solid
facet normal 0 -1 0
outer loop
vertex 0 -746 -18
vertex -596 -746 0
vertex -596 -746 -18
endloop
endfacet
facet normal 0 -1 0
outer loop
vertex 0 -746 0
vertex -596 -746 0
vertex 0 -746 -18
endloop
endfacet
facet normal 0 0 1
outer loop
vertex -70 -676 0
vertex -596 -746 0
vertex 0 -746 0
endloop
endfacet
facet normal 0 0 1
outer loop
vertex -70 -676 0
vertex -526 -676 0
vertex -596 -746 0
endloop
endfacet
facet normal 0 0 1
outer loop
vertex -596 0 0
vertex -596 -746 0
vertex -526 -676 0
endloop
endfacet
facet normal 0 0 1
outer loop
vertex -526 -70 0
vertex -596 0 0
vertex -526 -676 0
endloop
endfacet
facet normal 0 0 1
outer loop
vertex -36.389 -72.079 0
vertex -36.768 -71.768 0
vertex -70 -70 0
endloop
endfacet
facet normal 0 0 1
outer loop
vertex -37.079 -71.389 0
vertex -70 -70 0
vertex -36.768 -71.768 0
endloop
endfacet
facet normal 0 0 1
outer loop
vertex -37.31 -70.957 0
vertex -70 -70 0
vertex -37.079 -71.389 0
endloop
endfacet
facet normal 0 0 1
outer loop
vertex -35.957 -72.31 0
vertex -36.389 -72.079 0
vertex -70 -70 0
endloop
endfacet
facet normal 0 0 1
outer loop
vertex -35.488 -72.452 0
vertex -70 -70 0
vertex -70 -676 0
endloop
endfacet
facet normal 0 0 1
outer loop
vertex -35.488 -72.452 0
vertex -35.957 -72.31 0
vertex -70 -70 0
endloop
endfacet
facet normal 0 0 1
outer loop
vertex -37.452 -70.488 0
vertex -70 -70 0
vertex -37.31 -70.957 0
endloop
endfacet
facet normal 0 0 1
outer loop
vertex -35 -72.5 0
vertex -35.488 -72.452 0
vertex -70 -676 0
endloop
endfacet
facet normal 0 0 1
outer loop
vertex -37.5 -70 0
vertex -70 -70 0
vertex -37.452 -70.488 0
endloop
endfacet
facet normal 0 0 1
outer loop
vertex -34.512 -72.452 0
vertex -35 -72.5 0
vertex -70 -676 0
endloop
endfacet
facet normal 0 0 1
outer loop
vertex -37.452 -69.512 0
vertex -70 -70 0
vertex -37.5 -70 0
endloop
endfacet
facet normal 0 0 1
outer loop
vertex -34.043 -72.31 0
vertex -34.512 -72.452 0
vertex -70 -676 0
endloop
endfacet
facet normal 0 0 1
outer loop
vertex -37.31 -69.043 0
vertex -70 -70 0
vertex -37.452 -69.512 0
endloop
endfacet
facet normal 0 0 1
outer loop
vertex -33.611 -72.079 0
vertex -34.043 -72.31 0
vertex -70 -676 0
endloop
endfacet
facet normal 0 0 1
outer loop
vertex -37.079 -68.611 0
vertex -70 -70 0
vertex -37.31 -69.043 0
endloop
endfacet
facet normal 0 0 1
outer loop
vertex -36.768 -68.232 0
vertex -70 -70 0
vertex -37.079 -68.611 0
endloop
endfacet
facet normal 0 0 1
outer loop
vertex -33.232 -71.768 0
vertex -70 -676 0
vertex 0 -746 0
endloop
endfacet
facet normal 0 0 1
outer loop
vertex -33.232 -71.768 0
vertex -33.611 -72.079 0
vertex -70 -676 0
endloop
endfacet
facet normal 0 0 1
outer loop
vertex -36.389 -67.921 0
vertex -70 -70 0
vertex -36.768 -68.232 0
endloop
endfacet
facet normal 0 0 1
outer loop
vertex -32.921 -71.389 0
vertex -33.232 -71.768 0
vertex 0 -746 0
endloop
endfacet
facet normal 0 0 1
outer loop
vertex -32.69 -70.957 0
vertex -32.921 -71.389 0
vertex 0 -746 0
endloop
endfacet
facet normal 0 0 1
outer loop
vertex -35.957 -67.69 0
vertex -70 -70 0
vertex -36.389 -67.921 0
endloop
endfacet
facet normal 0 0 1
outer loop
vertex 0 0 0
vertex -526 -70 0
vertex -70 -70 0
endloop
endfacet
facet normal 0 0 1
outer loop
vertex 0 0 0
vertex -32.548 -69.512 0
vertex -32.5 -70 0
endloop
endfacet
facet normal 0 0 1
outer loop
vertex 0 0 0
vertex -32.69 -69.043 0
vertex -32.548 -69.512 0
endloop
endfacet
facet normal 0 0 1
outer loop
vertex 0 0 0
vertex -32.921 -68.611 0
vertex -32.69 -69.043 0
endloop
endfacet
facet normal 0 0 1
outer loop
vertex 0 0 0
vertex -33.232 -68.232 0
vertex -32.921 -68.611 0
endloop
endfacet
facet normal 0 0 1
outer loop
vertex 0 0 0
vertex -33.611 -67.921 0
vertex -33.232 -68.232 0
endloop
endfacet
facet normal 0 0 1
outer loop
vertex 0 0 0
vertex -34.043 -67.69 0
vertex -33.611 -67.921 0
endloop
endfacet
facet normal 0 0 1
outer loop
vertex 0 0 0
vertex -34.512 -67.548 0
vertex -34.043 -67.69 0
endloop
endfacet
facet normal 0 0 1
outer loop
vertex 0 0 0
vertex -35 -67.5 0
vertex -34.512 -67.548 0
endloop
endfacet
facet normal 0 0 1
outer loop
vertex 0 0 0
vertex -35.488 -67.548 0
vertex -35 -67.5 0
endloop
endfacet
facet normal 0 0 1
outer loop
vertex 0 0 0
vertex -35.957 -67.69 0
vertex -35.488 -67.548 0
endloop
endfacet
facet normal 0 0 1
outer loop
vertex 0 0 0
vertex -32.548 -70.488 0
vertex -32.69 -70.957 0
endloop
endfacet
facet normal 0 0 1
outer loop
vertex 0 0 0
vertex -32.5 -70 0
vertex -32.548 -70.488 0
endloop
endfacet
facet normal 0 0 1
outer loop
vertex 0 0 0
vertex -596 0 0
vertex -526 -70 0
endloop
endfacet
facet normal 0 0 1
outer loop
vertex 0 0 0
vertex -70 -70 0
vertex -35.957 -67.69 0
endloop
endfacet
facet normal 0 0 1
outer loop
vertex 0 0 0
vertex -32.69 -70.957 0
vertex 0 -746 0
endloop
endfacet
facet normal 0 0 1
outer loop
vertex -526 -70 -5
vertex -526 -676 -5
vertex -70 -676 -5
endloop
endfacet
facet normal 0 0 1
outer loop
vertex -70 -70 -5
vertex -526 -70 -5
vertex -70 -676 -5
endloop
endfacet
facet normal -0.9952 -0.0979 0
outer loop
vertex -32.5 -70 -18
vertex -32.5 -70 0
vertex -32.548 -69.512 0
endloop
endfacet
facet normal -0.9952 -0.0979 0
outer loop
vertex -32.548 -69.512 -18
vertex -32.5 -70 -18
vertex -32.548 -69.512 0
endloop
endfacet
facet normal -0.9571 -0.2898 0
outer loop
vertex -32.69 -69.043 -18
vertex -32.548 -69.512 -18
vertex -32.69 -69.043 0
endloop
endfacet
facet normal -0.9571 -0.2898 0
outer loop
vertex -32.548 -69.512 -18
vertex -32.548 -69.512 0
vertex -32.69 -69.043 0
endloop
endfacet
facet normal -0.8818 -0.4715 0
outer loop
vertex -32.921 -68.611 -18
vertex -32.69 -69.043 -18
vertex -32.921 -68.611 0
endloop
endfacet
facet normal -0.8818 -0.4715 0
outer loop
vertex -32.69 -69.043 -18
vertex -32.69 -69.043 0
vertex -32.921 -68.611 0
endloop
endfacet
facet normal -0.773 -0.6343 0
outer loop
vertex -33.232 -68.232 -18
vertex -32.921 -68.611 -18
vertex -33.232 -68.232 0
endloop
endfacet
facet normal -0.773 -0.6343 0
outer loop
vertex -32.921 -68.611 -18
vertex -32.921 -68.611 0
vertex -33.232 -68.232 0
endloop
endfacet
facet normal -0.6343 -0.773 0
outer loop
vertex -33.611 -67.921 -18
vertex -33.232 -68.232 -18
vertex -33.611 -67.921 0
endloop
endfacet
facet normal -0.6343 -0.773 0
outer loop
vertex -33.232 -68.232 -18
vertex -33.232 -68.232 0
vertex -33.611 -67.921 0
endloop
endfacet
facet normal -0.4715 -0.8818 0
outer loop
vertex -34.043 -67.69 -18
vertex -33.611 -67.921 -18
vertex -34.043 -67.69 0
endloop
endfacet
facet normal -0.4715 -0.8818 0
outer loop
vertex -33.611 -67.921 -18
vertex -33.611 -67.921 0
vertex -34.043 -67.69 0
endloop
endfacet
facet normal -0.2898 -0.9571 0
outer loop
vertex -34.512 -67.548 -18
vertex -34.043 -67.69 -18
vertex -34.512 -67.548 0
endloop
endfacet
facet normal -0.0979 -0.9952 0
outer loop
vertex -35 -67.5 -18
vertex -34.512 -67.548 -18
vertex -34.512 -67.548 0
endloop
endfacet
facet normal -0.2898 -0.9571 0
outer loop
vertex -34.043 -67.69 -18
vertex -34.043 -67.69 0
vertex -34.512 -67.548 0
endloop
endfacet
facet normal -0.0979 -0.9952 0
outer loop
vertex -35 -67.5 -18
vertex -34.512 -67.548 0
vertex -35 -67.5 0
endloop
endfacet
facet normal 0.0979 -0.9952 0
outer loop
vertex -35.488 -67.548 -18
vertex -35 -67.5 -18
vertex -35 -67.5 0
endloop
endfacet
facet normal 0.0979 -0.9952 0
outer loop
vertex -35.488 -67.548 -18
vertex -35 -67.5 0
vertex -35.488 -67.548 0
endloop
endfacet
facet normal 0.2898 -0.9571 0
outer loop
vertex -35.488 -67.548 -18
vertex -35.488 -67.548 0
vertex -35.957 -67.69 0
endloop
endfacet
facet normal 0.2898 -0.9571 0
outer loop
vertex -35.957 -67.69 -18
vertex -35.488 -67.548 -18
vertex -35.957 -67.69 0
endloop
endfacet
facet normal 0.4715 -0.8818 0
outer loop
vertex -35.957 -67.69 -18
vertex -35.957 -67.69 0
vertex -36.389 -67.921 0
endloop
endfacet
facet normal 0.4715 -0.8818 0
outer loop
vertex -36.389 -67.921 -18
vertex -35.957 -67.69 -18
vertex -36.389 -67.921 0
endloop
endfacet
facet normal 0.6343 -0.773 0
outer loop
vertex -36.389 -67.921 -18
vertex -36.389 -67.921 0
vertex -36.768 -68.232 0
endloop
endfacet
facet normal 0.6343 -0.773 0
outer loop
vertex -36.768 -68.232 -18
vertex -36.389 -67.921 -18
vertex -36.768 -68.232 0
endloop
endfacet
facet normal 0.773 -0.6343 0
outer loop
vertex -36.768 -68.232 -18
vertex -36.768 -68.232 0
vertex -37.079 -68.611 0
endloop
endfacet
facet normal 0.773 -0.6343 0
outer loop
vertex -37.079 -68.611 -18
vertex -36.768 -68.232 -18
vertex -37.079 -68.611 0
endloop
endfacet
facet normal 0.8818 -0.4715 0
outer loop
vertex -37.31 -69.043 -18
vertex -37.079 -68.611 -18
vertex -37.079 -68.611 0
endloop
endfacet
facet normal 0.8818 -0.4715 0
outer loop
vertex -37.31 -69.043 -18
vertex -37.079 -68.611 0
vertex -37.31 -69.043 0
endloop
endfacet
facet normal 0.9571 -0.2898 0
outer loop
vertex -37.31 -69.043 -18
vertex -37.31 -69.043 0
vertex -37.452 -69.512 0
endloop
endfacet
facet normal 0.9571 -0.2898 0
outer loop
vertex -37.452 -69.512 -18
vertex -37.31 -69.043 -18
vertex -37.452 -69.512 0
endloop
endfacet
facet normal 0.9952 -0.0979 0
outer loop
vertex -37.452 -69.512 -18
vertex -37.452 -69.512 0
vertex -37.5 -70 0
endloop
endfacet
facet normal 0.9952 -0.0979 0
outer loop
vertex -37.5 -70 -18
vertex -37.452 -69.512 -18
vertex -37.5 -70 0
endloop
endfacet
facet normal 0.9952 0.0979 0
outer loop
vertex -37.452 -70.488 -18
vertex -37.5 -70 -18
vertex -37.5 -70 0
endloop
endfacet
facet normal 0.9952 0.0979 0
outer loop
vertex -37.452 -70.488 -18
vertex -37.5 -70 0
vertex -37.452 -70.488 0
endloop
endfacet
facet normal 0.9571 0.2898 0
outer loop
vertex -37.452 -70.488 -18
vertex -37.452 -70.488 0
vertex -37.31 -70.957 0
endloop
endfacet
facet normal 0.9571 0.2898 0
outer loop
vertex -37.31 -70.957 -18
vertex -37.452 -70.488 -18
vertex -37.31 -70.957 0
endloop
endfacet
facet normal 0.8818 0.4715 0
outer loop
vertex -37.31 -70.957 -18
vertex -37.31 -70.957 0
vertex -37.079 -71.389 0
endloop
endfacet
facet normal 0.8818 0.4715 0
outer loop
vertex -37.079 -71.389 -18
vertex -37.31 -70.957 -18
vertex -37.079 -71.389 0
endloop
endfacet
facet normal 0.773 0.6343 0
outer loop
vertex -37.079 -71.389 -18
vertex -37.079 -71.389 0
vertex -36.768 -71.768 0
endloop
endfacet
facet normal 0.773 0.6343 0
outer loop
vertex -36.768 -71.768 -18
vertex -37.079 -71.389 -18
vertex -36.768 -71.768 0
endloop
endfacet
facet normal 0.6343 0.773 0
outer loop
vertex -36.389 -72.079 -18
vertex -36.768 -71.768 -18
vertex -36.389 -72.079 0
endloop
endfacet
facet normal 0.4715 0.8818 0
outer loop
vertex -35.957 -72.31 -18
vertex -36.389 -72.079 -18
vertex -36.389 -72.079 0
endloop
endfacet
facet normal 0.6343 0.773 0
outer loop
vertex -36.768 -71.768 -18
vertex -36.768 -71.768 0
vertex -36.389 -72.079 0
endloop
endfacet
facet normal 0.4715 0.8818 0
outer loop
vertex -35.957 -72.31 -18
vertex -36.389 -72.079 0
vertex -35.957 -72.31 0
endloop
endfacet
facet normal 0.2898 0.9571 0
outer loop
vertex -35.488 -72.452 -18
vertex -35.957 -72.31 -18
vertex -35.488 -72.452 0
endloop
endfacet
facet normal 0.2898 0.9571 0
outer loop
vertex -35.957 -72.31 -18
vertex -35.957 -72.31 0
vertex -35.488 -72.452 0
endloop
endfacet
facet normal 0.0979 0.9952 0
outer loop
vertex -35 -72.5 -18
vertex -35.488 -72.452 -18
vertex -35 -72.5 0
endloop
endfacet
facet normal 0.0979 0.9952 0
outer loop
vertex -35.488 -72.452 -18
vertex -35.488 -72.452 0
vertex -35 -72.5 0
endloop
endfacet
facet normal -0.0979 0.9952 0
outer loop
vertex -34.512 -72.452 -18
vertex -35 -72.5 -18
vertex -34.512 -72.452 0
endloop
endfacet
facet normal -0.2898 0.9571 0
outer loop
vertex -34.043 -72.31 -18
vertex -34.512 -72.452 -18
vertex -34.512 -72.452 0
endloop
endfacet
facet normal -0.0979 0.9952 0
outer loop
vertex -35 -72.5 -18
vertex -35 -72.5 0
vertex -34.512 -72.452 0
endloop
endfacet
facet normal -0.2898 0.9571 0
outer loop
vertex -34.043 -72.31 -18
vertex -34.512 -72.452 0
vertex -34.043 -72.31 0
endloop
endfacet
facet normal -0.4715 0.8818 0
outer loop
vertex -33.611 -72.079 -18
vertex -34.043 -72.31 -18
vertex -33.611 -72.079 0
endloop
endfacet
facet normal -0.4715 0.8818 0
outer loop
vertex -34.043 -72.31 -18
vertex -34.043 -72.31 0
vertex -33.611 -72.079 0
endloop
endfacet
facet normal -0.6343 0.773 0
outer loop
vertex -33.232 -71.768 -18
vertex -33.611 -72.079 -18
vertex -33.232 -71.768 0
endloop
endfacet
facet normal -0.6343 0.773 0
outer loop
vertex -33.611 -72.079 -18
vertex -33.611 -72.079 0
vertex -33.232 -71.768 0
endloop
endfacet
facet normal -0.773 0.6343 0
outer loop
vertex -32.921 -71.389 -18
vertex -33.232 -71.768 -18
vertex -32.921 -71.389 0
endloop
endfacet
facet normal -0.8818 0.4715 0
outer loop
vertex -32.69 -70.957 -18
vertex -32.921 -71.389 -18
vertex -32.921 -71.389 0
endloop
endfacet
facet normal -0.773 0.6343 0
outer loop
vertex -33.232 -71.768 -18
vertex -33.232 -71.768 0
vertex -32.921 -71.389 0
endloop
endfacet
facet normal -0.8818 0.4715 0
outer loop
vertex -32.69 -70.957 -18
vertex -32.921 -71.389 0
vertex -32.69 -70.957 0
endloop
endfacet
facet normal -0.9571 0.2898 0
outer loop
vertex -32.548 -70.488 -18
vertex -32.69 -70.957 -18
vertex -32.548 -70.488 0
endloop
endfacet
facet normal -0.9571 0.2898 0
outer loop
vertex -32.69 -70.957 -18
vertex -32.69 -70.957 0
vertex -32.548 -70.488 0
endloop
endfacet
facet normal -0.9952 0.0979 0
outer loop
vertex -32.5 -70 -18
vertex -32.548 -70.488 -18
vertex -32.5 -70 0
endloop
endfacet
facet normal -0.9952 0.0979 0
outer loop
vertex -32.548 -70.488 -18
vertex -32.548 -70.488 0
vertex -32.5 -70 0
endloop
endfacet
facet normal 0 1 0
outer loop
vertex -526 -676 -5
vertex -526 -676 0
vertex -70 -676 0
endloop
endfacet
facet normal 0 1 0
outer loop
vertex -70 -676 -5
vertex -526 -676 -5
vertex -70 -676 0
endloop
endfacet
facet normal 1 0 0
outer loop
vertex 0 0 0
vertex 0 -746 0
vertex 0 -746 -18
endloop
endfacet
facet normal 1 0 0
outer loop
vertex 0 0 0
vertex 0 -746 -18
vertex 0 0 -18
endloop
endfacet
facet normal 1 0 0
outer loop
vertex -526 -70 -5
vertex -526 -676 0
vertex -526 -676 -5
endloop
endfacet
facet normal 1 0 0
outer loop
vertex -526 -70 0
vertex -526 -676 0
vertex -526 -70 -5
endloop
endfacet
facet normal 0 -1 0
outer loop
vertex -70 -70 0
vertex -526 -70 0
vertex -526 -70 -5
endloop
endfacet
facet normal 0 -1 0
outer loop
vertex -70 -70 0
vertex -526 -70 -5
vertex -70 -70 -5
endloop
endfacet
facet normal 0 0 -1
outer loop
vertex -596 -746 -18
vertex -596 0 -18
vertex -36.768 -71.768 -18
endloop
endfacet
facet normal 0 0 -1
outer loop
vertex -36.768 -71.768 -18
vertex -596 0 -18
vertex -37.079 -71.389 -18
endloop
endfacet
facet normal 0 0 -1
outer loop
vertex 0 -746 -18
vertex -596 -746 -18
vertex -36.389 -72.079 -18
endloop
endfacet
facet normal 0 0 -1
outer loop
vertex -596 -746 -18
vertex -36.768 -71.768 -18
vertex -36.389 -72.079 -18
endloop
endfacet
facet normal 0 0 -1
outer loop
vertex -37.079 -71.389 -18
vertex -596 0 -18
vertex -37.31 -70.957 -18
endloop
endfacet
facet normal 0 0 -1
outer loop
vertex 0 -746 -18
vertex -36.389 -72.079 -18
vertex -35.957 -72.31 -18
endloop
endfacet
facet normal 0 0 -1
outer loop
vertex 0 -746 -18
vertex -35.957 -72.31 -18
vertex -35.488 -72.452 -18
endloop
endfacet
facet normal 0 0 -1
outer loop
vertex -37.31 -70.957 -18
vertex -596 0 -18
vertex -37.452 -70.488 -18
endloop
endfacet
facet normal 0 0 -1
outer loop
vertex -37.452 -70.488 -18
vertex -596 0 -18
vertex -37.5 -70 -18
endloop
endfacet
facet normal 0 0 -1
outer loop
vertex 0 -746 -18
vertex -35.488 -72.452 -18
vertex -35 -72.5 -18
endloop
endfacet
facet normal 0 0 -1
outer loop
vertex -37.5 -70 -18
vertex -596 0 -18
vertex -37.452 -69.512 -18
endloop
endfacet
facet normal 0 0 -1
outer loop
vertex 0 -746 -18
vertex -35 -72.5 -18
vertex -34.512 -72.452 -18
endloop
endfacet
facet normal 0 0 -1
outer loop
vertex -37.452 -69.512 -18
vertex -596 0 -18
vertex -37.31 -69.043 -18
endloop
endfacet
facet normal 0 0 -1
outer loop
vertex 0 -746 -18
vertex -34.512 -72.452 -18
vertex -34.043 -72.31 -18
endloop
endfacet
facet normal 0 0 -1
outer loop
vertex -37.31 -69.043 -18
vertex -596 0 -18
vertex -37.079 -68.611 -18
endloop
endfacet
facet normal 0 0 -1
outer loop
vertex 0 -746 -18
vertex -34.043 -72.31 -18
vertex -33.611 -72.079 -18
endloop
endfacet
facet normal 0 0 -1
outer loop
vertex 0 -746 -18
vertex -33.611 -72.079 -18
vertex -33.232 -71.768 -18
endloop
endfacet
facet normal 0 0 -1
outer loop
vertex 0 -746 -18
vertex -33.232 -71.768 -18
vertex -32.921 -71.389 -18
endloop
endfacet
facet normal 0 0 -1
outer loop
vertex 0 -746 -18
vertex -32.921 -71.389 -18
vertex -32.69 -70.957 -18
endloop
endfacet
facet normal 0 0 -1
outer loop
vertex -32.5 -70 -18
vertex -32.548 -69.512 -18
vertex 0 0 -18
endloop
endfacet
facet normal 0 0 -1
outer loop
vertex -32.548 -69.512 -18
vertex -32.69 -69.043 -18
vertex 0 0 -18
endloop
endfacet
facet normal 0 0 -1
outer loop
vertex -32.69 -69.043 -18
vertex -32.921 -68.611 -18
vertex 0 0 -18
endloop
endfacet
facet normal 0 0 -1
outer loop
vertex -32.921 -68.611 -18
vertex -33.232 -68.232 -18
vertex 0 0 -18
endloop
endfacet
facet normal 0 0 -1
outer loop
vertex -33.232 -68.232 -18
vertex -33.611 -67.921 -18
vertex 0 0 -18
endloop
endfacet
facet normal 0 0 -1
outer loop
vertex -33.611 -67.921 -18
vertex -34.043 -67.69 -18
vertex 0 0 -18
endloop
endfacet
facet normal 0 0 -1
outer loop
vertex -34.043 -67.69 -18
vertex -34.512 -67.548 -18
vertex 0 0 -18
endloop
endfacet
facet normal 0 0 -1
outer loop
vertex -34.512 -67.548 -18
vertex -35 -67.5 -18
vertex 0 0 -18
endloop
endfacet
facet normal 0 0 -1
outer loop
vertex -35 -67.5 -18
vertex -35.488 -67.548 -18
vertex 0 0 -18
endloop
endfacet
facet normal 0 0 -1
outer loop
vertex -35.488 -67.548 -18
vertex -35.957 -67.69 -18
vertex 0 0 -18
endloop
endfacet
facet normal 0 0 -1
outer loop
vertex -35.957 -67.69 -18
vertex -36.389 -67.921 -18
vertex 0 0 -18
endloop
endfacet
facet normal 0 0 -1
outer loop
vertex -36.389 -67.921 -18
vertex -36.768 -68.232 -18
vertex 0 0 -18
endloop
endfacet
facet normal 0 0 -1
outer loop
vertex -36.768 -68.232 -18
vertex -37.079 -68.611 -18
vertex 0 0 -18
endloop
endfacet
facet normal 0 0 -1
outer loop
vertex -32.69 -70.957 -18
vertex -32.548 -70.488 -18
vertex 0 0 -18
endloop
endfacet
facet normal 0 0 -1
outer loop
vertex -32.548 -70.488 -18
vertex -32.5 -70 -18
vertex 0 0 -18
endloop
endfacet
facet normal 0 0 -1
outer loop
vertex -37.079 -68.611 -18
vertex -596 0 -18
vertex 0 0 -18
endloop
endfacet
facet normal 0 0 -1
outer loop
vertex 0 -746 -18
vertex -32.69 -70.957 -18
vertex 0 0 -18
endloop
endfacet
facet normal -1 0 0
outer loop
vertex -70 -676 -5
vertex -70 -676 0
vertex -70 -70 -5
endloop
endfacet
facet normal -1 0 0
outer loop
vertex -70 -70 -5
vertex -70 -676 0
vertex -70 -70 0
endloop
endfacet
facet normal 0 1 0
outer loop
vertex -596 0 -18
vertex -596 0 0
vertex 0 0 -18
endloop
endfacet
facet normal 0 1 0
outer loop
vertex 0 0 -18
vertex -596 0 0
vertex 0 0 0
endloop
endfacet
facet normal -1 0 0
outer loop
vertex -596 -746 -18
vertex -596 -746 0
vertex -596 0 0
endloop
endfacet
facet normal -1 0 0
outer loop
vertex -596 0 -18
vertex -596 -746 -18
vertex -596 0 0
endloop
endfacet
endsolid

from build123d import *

# Parameters (mm, degrees)
SKETCH1_W          = 596
SKETCH1_H          = 746
DOOR_PART_DEPTH    = 18
SKETCH6_R          = 2.5
BASE_SINGLE_DEPTH  = 956.016230229
SKETCH7_W          = 456
SKETCH7_H          = 606
CUT_EXTRUDE1_DEPTH = 5


with BuildPart() as part:
    # Sketch1 → Door Part (new body)
    with BuildSketch(Plane.XY):
        with Locations((-298, -373)):
            Rectangle(SKETCH1_W, SKETCH1_H)
    extrude(amount=-DOOR_PART_DEPTH)

    # Sketch6 → Base Single (cut, through all)
    with BuildSketch(Plane.XY):
        with Locations((-35, -70)):
            Circle(SKETCH6_R)
    extrude(amount=-BASE_SINGLE_DEPTH, mode=Mode.SUBTRACT)

    # Sketch7 → Cut-Extrude1 (cut)
    with BuildSketch(Plane.XY):
        with Locations((-298, -373)):
            Rectangle(SKETCH7_W, SKETCH7_H)
    extrude(amount=-CUT_EXTRUDE1_DEPTH, mode=Mode.SUBTRACT)


solid = part.part
